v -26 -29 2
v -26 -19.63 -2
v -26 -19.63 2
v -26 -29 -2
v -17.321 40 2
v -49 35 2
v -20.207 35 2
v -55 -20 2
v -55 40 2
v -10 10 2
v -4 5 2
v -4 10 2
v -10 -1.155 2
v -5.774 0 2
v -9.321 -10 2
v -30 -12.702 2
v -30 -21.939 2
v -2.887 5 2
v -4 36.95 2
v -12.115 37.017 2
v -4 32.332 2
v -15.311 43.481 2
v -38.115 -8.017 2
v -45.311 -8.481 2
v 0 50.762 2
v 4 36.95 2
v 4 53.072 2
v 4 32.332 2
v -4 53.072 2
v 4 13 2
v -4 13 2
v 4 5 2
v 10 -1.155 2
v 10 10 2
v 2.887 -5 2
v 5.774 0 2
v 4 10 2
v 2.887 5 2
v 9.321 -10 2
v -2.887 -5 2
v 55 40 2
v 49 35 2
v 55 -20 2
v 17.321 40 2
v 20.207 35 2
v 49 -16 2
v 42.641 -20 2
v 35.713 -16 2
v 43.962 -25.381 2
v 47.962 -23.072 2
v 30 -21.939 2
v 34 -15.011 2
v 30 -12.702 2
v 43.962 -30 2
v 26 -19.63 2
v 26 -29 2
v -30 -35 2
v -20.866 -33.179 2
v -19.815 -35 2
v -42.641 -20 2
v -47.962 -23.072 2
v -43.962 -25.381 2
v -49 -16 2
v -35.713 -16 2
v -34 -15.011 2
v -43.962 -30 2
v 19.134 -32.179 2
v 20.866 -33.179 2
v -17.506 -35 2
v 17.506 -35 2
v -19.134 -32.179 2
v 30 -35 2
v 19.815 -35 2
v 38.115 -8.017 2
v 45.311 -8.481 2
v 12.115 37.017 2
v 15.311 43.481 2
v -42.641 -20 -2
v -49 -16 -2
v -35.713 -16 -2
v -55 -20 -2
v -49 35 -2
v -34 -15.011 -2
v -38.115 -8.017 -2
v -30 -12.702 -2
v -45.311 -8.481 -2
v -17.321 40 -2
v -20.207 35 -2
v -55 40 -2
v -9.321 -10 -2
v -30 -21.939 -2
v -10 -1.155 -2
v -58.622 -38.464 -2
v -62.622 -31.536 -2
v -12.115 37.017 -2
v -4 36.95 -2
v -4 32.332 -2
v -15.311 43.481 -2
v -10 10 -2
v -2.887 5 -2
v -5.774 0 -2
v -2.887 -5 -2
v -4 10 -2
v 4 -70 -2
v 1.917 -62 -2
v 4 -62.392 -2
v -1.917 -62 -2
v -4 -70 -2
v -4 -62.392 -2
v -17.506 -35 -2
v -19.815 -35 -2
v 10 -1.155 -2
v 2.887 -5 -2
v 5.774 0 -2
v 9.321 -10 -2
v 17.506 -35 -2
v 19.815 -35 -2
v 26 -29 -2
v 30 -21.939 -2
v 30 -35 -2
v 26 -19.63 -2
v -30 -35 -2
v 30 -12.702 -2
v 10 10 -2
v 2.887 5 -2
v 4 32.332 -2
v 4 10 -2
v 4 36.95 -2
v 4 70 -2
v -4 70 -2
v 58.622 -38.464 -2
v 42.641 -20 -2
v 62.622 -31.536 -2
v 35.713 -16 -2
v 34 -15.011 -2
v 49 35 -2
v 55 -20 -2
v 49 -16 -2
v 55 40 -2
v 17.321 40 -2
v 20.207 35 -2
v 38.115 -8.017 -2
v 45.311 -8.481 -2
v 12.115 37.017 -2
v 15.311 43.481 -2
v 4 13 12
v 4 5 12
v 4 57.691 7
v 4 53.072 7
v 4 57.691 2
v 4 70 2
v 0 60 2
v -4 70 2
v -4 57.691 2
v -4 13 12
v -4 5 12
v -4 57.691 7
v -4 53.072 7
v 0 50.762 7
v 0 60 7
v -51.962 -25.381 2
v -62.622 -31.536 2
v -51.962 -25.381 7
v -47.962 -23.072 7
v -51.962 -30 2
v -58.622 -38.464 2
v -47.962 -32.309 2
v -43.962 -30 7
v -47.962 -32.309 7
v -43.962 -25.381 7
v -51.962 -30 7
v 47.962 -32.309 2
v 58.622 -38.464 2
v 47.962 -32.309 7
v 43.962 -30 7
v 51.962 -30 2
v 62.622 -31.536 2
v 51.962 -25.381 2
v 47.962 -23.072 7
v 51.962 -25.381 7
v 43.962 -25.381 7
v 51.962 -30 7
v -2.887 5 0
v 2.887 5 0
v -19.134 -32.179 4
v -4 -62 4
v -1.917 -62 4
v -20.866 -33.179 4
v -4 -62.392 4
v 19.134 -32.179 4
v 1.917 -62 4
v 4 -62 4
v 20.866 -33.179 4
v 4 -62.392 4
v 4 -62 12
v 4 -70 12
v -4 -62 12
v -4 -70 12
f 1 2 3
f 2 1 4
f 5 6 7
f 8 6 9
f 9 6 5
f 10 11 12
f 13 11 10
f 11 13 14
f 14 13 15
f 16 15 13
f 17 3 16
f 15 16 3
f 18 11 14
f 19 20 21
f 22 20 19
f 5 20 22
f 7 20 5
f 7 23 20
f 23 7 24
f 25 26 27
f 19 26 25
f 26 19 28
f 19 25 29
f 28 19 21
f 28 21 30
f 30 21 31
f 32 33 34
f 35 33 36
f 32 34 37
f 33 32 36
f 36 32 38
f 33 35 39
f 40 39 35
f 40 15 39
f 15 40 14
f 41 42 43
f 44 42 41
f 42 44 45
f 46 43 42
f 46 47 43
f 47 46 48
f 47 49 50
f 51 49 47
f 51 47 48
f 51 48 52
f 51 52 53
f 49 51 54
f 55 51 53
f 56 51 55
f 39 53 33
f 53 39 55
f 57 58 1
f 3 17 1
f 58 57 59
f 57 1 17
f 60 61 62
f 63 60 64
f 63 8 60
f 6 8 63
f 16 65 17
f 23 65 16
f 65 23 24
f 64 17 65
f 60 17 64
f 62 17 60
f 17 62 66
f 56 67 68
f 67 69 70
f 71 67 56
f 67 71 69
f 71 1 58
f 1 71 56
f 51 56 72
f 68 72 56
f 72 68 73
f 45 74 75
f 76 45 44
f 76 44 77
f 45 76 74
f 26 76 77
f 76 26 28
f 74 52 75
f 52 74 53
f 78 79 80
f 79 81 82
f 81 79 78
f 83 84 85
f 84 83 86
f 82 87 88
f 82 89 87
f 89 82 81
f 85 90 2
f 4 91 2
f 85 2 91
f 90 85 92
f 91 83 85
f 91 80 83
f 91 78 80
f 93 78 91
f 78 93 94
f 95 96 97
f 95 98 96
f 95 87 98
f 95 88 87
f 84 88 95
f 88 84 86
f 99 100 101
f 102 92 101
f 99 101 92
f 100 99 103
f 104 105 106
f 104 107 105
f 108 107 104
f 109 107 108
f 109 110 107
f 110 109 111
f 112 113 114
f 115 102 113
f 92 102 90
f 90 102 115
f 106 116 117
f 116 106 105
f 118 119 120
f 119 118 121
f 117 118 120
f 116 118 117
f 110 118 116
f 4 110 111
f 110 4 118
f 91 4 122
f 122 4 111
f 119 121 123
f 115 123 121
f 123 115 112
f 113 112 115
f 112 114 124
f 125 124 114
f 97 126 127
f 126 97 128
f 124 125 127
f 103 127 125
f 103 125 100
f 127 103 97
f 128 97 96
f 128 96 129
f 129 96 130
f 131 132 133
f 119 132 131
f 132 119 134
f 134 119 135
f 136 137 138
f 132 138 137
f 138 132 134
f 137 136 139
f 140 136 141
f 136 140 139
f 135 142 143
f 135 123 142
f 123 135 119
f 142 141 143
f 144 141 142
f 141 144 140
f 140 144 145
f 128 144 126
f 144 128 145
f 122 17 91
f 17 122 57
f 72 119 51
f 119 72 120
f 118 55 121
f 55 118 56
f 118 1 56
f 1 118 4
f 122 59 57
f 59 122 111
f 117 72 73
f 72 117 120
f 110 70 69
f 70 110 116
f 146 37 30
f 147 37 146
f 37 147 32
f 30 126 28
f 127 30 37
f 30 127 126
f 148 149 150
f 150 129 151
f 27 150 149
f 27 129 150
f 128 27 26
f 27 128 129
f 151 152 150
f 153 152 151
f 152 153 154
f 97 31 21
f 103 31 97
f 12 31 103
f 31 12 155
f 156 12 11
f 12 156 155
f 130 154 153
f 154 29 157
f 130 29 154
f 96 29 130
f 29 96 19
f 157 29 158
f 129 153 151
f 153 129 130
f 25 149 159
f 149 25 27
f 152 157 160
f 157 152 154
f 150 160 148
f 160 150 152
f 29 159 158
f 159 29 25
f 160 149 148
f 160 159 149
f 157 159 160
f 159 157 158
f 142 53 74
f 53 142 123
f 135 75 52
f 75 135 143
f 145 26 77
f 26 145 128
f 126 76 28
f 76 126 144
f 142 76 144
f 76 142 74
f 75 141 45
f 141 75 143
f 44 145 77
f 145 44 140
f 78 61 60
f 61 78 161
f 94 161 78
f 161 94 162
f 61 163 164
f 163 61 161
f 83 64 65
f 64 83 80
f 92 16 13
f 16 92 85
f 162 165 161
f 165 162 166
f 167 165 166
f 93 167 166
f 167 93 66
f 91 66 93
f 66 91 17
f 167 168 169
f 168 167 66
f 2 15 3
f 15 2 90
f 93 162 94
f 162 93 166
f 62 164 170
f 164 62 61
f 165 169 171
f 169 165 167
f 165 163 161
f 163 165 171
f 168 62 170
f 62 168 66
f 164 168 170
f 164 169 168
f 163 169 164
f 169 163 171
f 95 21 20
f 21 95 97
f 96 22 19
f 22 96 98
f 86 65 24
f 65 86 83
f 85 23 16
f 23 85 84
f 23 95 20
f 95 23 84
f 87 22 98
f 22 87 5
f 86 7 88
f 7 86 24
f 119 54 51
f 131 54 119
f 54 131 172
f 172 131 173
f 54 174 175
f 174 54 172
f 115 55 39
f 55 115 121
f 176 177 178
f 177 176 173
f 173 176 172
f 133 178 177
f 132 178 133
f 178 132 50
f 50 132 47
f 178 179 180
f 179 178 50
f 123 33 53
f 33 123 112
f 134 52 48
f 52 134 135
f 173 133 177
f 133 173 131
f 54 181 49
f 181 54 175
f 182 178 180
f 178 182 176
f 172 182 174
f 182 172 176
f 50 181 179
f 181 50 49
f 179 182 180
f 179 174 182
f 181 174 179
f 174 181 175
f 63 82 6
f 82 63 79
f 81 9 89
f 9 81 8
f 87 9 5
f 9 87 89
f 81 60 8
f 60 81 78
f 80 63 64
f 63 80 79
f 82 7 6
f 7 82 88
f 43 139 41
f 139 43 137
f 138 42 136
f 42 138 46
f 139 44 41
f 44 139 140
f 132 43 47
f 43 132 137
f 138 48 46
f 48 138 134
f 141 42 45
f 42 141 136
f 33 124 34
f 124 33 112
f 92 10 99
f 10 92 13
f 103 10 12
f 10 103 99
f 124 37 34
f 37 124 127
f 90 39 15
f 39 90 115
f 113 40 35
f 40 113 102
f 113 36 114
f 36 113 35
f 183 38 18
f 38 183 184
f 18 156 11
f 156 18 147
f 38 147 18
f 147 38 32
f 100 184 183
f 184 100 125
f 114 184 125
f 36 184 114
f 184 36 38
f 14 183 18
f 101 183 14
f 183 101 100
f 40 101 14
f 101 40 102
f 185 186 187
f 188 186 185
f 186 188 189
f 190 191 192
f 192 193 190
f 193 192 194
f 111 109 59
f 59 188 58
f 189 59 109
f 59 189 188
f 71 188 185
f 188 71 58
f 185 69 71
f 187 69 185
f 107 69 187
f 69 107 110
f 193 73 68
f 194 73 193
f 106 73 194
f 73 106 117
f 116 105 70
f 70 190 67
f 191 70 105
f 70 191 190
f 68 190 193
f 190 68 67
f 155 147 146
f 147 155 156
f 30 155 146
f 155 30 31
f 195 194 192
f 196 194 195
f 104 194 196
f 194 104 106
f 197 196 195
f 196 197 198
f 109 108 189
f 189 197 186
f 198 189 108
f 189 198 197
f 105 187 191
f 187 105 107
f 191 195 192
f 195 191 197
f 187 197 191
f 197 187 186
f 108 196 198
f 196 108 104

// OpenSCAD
union() {

  for (a=[0,120,240]) rotate([0,0,a]) {
    // tip 39+62/2 = 70 mm from exact center
    translate([0, 39,0]) cube([8,62,4],center=true);
    // outer edge aligned with center of tip of bar towards tower,
    // exactly 35mm from center
    translate([0,-32,0]) {
      cube([60,6,4],center=true);
      for (b=[-1,1]) 
        translate([28*b,8,0]) cube([4,15,4],center=true);
    }

    // more stuff to test Z scale
    // corners exactly 60 from center, on outside, 5mm above rest.
    translate([0,60-4/cos(30),0]) rotate([0,0,30]) cylinder(r=4/cos(30),h=2+5,$fn=6);
  }
  // lowest (-Y) extent : tip center at -70/2=35, but 8mm wide bar extends another 4*cos(30)
  // Low Y point: 38.464
  // hi Y point, 70.
  // If slic3r tries to center this, it will shift things by 15.768,
  // so when slicing, put plot center at (0,15.768) to force object center
  // to be printbed center.
  echo("centroid 15.768mm below center of Y-axis extent");

  // more XY-square parts to test straight lines/squareness
  for(a=[-1,1]) {
    translate([52*a, 10  ,0]) cube([ 6,60,4],center=true);
    translate([43*a,-18  ,0]) cube([16, 4,4],center=true);
    translate([34*a, 37.5,0]) cube([35, 5,4],center=true);
  }

  difference() {
    //cube([20/cos(30),20,4],center=true);
    cube([20,20,4],center=true);
    translate([0,0,-3]) cylinder(h=6,r=5/cos(30),$fn=6);  // 1cm wide hex, marks center
  }

  // more z-scale tests
  translate([0,5+4,12/2]) cube([8,8,12],center=true);

  // This little post ensures that slic3r puts drawing centered correctly,
  // without manual 15.768 mm offset mentioned above.
  // I also had problems with re-melt when printing one tall spire.
  // this will force the head to move on each layer and give things more time
  // to cool
  translate([0,-70+4,5]) cube([8,8,14],center=true);
  for(a=[-1,1]) translate([10*a,-50,1])
    rotate([0,0,-a*30]) cube([2,40,6],center=true);

}

%translate([0,0,-1]) rotate([0,0,30]) cylinder(h=2,r=70,$fn=6);
